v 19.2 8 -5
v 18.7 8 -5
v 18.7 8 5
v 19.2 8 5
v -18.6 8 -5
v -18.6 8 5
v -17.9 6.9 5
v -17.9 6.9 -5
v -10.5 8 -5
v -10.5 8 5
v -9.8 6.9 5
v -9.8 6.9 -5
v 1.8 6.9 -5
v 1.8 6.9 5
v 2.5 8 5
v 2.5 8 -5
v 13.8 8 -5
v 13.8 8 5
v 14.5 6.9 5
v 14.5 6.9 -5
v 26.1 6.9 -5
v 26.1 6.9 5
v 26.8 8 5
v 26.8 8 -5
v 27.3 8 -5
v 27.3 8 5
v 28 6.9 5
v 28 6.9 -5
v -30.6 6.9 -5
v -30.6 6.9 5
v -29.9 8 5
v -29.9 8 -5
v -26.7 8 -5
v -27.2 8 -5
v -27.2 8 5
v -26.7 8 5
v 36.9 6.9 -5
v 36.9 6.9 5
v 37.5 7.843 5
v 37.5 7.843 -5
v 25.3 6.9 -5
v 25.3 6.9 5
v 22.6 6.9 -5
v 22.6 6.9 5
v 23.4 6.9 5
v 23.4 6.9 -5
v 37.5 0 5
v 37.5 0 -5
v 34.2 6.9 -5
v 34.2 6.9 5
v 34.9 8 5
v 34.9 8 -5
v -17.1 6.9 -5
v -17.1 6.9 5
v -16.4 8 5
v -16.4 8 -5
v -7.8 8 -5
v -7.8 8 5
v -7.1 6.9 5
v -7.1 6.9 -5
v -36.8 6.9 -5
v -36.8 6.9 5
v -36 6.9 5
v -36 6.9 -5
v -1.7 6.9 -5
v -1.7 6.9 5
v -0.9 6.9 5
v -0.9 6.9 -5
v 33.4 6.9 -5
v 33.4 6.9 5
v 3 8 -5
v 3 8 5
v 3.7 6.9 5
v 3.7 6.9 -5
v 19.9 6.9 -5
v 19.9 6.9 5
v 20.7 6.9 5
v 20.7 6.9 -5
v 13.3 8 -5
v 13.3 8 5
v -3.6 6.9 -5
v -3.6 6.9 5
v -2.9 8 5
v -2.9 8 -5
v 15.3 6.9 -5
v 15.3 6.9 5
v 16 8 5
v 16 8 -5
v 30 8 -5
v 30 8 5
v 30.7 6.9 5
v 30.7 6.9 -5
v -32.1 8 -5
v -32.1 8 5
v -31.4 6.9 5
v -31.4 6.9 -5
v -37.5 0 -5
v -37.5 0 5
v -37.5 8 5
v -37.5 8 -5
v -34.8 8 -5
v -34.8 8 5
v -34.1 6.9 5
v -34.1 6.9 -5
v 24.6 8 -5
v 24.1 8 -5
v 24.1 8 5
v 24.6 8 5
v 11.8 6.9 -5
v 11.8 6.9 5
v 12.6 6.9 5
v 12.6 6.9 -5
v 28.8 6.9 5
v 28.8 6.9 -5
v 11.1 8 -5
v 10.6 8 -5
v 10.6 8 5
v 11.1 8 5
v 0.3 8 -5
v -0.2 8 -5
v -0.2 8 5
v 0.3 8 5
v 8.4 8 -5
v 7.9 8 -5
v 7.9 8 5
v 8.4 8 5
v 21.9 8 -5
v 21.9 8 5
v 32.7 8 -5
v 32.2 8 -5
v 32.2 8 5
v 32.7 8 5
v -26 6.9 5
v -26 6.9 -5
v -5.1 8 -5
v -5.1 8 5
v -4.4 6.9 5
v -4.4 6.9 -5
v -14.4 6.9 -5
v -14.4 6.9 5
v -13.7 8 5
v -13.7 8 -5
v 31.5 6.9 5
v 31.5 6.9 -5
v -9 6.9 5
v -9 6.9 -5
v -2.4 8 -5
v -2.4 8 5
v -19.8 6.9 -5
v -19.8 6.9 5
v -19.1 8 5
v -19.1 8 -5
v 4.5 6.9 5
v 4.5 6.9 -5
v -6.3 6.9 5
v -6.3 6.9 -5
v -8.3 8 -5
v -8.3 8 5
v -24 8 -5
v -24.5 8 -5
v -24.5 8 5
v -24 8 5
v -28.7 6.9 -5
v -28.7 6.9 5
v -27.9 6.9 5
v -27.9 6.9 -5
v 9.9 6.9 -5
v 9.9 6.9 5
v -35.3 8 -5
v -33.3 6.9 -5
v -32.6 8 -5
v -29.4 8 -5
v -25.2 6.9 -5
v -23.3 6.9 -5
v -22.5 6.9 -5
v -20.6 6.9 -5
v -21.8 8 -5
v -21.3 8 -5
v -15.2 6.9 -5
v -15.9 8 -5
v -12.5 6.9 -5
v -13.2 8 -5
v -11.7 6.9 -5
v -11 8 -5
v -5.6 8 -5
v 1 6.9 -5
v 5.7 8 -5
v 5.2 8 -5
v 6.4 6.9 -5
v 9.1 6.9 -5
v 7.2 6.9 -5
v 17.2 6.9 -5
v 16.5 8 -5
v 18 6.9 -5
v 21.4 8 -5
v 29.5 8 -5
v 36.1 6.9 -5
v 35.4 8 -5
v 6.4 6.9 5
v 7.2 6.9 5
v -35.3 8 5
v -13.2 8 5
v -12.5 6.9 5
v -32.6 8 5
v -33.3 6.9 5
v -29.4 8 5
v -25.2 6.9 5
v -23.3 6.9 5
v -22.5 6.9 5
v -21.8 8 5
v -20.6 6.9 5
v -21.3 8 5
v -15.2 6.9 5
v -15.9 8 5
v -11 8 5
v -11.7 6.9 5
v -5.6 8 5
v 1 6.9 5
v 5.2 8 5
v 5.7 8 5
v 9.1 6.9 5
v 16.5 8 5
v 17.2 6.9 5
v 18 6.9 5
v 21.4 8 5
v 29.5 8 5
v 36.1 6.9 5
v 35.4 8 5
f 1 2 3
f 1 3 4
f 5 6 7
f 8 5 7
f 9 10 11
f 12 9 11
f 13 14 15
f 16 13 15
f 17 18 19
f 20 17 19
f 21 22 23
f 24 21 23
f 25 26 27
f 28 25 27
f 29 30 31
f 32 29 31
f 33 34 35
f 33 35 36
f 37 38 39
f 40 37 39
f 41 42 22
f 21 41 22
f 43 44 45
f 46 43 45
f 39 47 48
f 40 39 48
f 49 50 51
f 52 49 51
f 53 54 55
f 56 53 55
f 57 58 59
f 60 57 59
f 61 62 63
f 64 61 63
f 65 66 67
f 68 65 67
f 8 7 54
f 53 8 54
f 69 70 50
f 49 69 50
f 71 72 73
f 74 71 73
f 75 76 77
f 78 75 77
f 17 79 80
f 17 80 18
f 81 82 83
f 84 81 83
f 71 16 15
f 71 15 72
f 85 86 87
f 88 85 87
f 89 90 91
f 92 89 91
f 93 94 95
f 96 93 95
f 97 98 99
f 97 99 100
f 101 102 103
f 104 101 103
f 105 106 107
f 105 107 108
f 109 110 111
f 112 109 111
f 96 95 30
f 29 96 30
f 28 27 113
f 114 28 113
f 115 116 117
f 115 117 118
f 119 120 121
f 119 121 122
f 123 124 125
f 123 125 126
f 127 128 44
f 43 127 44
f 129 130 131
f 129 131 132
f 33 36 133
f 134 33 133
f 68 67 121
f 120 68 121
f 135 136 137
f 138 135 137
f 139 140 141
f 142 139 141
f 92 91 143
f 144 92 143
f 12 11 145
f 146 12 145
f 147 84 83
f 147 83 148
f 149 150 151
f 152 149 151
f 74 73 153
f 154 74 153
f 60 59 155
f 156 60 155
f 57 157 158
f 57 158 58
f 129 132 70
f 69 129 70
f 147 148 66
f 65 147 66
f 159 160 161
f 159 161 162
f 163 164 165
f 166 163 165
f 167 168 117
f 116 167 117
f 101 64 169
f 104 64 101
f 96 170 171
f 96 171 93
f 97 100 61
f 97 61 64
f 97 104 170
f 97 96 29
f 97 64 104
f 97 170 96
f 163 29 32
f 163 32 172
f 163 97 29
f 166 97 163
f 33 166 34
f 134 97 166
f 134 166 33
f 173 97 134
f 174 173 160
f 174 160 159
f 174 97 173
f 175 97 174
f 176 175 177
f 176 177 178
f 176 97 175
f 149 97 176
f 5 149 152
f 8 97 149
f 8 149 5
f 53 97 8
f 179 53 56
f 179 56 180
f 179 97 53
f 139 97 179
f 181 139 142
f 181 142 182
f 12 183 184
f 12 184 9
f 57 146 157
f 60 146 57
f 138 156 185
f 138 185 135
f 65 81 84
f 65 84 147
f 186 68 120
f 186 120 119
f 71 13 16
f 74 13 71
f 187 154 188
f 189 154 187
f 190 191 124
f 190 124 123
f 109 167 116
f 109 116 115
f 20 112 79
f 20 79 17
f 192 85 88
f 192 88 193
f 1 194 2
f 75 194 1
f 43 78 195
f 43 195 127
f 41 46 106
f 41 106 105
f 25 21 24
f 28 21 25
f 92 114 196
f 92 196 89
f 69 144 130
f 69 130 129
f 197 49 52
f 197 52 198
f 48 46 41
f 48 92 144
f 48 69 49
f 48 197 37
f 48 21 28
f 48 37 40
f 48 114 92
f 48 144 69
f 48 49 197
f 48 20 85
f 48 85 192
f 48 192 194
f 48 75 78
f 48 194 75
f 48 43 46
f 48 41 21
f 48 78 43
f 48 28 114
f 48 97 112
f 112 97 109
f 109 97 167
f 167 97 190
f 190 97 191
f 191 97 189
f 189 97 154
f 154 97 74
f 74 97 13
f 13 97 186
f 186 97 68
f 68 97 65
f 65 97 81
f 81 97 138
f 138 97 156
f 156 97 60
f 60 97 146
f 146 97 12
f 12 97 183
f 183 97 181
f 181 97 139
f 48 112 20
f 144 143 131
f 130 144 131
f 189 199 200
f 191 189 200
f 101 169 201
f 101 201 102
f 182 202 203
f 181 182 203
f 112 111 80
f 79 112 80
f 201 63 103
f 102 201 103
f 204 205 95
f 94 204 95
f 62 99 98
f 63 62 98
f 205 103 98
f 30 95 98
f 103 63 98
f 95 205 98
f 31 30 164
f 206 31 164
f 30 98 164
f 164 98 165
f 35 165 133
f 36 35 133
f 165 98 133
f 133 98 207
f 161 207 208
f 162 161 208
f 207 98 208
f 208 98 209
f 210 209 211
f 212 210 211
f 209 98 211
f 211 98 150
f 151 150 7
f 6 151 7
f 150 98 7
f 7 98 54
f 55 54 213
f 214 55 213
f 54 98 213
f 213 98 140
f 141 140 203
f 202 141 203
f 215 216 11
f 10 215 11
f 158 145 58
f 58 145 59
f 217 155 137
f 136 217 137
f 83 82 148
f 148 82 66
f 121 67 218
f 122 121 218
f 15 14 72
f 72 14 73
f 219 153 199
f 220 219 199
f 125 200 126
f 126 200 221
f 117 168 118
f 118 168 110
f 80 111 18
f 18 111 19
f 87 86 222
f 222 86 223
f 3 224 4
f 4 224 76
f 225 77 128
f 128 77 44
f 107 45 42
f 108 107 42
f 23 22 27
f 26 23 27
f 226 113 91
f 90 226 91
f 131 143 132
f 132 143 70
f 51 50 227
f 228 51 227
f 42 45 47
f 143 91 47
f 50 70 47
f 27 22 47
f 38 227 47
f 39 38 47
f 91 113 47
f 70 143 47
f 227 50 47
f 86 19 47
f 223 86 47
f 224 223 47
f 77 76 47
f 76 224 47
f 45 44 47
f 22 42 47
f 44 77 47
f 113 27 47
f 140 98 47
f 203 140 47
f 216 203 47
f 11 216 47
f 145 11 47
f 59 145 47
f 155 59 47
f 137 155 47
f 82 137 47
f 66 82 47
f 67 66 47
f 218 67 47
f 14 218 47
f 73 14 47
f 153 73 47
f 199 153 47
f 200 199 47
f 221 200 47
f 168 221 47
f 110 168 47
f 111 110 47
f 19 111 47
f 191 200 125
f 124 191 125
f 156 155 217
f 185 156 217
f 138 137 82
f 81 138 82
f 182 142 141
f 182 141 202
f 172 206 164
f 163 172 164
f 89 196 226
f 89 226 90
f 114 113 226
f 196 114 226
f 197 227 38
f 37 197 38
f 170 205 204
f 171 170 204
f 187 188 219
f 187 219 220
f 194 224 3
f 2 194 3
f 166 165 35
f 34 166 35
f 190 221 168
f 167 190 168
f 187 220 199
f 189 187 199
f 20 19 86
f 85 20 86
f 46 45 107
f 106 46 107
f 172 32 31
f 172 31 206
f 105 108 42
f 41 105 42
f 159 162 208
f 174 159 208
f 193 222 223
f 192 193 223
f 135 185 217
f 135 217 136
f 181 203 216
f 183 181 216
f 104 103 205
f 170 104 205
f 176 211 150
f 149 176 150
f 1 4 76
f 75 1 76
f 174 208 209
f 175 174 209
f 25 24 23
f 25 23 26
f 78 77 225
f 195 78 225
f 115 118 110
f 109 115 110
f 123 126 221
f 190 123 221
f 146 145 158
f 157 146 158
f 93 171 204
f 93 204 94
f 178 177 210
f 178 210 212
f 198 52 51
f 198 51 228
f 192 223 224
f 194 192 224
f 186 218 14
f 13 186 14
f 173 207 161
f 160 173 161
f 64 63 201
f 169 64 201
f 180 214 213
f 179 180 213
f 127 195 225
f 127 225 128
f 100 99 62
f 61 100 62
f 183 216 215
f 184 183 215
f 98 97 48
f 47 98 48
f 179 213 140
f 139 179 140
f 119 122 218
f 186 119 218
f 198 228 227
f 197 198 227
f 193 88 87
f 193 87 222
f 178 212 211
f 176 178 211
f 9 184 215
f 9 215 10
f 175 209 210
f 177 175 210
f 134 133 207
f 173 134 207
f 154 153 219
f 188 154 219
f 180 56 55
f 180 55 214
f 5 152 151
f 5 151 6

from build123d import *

# Parameters (mm, degrees)
SKETCH2_W           = 75
SKETCH2_H           = 10
BOSS_EXTRUDE1_DEPTH = 8
CUT_EXTRUDE1_DEPTH  = 15
LPATTERN1_COUNT     = 31
LPATTERN1_PITCH     = 2.7


with BuildPart() as part:
    # Sketch2 → Boss-Extrude1 (new body)
    with BuildSketch(Plane(origin=(0, 0, 0), x_dir=(1, 0, 0), z_dir=(0, 1, 0))):
        Rectangle(SKETCH2_W, SKETCH2_H)
    extrude(amount=BOSS_EXTRUDE1_DEPTH)

    # Sketch3 → Cut-Extrude1 (cut)
    with BuildSketch(Plane.XY.offset(5)):
        Polygon((-36.8, 6.9), (-36, 6.9), (-35.3, 8), (-37.5, 8), align=None)
    cut_extrude1 = extrude(amount=-CUT_EXTRUDE1_DEPTH, mode=Mode.SUBTRACT)

    # LPattern1: Cut-Extrude1 ×31
    with Locations(*[(i * LPATTERN1_PITCH, 0, 0) for i in range(1, LPATTERN1_COUNT)]):
        add(cut_extrude1, mode=Mode.SUBTRACT)


solid = part.part
